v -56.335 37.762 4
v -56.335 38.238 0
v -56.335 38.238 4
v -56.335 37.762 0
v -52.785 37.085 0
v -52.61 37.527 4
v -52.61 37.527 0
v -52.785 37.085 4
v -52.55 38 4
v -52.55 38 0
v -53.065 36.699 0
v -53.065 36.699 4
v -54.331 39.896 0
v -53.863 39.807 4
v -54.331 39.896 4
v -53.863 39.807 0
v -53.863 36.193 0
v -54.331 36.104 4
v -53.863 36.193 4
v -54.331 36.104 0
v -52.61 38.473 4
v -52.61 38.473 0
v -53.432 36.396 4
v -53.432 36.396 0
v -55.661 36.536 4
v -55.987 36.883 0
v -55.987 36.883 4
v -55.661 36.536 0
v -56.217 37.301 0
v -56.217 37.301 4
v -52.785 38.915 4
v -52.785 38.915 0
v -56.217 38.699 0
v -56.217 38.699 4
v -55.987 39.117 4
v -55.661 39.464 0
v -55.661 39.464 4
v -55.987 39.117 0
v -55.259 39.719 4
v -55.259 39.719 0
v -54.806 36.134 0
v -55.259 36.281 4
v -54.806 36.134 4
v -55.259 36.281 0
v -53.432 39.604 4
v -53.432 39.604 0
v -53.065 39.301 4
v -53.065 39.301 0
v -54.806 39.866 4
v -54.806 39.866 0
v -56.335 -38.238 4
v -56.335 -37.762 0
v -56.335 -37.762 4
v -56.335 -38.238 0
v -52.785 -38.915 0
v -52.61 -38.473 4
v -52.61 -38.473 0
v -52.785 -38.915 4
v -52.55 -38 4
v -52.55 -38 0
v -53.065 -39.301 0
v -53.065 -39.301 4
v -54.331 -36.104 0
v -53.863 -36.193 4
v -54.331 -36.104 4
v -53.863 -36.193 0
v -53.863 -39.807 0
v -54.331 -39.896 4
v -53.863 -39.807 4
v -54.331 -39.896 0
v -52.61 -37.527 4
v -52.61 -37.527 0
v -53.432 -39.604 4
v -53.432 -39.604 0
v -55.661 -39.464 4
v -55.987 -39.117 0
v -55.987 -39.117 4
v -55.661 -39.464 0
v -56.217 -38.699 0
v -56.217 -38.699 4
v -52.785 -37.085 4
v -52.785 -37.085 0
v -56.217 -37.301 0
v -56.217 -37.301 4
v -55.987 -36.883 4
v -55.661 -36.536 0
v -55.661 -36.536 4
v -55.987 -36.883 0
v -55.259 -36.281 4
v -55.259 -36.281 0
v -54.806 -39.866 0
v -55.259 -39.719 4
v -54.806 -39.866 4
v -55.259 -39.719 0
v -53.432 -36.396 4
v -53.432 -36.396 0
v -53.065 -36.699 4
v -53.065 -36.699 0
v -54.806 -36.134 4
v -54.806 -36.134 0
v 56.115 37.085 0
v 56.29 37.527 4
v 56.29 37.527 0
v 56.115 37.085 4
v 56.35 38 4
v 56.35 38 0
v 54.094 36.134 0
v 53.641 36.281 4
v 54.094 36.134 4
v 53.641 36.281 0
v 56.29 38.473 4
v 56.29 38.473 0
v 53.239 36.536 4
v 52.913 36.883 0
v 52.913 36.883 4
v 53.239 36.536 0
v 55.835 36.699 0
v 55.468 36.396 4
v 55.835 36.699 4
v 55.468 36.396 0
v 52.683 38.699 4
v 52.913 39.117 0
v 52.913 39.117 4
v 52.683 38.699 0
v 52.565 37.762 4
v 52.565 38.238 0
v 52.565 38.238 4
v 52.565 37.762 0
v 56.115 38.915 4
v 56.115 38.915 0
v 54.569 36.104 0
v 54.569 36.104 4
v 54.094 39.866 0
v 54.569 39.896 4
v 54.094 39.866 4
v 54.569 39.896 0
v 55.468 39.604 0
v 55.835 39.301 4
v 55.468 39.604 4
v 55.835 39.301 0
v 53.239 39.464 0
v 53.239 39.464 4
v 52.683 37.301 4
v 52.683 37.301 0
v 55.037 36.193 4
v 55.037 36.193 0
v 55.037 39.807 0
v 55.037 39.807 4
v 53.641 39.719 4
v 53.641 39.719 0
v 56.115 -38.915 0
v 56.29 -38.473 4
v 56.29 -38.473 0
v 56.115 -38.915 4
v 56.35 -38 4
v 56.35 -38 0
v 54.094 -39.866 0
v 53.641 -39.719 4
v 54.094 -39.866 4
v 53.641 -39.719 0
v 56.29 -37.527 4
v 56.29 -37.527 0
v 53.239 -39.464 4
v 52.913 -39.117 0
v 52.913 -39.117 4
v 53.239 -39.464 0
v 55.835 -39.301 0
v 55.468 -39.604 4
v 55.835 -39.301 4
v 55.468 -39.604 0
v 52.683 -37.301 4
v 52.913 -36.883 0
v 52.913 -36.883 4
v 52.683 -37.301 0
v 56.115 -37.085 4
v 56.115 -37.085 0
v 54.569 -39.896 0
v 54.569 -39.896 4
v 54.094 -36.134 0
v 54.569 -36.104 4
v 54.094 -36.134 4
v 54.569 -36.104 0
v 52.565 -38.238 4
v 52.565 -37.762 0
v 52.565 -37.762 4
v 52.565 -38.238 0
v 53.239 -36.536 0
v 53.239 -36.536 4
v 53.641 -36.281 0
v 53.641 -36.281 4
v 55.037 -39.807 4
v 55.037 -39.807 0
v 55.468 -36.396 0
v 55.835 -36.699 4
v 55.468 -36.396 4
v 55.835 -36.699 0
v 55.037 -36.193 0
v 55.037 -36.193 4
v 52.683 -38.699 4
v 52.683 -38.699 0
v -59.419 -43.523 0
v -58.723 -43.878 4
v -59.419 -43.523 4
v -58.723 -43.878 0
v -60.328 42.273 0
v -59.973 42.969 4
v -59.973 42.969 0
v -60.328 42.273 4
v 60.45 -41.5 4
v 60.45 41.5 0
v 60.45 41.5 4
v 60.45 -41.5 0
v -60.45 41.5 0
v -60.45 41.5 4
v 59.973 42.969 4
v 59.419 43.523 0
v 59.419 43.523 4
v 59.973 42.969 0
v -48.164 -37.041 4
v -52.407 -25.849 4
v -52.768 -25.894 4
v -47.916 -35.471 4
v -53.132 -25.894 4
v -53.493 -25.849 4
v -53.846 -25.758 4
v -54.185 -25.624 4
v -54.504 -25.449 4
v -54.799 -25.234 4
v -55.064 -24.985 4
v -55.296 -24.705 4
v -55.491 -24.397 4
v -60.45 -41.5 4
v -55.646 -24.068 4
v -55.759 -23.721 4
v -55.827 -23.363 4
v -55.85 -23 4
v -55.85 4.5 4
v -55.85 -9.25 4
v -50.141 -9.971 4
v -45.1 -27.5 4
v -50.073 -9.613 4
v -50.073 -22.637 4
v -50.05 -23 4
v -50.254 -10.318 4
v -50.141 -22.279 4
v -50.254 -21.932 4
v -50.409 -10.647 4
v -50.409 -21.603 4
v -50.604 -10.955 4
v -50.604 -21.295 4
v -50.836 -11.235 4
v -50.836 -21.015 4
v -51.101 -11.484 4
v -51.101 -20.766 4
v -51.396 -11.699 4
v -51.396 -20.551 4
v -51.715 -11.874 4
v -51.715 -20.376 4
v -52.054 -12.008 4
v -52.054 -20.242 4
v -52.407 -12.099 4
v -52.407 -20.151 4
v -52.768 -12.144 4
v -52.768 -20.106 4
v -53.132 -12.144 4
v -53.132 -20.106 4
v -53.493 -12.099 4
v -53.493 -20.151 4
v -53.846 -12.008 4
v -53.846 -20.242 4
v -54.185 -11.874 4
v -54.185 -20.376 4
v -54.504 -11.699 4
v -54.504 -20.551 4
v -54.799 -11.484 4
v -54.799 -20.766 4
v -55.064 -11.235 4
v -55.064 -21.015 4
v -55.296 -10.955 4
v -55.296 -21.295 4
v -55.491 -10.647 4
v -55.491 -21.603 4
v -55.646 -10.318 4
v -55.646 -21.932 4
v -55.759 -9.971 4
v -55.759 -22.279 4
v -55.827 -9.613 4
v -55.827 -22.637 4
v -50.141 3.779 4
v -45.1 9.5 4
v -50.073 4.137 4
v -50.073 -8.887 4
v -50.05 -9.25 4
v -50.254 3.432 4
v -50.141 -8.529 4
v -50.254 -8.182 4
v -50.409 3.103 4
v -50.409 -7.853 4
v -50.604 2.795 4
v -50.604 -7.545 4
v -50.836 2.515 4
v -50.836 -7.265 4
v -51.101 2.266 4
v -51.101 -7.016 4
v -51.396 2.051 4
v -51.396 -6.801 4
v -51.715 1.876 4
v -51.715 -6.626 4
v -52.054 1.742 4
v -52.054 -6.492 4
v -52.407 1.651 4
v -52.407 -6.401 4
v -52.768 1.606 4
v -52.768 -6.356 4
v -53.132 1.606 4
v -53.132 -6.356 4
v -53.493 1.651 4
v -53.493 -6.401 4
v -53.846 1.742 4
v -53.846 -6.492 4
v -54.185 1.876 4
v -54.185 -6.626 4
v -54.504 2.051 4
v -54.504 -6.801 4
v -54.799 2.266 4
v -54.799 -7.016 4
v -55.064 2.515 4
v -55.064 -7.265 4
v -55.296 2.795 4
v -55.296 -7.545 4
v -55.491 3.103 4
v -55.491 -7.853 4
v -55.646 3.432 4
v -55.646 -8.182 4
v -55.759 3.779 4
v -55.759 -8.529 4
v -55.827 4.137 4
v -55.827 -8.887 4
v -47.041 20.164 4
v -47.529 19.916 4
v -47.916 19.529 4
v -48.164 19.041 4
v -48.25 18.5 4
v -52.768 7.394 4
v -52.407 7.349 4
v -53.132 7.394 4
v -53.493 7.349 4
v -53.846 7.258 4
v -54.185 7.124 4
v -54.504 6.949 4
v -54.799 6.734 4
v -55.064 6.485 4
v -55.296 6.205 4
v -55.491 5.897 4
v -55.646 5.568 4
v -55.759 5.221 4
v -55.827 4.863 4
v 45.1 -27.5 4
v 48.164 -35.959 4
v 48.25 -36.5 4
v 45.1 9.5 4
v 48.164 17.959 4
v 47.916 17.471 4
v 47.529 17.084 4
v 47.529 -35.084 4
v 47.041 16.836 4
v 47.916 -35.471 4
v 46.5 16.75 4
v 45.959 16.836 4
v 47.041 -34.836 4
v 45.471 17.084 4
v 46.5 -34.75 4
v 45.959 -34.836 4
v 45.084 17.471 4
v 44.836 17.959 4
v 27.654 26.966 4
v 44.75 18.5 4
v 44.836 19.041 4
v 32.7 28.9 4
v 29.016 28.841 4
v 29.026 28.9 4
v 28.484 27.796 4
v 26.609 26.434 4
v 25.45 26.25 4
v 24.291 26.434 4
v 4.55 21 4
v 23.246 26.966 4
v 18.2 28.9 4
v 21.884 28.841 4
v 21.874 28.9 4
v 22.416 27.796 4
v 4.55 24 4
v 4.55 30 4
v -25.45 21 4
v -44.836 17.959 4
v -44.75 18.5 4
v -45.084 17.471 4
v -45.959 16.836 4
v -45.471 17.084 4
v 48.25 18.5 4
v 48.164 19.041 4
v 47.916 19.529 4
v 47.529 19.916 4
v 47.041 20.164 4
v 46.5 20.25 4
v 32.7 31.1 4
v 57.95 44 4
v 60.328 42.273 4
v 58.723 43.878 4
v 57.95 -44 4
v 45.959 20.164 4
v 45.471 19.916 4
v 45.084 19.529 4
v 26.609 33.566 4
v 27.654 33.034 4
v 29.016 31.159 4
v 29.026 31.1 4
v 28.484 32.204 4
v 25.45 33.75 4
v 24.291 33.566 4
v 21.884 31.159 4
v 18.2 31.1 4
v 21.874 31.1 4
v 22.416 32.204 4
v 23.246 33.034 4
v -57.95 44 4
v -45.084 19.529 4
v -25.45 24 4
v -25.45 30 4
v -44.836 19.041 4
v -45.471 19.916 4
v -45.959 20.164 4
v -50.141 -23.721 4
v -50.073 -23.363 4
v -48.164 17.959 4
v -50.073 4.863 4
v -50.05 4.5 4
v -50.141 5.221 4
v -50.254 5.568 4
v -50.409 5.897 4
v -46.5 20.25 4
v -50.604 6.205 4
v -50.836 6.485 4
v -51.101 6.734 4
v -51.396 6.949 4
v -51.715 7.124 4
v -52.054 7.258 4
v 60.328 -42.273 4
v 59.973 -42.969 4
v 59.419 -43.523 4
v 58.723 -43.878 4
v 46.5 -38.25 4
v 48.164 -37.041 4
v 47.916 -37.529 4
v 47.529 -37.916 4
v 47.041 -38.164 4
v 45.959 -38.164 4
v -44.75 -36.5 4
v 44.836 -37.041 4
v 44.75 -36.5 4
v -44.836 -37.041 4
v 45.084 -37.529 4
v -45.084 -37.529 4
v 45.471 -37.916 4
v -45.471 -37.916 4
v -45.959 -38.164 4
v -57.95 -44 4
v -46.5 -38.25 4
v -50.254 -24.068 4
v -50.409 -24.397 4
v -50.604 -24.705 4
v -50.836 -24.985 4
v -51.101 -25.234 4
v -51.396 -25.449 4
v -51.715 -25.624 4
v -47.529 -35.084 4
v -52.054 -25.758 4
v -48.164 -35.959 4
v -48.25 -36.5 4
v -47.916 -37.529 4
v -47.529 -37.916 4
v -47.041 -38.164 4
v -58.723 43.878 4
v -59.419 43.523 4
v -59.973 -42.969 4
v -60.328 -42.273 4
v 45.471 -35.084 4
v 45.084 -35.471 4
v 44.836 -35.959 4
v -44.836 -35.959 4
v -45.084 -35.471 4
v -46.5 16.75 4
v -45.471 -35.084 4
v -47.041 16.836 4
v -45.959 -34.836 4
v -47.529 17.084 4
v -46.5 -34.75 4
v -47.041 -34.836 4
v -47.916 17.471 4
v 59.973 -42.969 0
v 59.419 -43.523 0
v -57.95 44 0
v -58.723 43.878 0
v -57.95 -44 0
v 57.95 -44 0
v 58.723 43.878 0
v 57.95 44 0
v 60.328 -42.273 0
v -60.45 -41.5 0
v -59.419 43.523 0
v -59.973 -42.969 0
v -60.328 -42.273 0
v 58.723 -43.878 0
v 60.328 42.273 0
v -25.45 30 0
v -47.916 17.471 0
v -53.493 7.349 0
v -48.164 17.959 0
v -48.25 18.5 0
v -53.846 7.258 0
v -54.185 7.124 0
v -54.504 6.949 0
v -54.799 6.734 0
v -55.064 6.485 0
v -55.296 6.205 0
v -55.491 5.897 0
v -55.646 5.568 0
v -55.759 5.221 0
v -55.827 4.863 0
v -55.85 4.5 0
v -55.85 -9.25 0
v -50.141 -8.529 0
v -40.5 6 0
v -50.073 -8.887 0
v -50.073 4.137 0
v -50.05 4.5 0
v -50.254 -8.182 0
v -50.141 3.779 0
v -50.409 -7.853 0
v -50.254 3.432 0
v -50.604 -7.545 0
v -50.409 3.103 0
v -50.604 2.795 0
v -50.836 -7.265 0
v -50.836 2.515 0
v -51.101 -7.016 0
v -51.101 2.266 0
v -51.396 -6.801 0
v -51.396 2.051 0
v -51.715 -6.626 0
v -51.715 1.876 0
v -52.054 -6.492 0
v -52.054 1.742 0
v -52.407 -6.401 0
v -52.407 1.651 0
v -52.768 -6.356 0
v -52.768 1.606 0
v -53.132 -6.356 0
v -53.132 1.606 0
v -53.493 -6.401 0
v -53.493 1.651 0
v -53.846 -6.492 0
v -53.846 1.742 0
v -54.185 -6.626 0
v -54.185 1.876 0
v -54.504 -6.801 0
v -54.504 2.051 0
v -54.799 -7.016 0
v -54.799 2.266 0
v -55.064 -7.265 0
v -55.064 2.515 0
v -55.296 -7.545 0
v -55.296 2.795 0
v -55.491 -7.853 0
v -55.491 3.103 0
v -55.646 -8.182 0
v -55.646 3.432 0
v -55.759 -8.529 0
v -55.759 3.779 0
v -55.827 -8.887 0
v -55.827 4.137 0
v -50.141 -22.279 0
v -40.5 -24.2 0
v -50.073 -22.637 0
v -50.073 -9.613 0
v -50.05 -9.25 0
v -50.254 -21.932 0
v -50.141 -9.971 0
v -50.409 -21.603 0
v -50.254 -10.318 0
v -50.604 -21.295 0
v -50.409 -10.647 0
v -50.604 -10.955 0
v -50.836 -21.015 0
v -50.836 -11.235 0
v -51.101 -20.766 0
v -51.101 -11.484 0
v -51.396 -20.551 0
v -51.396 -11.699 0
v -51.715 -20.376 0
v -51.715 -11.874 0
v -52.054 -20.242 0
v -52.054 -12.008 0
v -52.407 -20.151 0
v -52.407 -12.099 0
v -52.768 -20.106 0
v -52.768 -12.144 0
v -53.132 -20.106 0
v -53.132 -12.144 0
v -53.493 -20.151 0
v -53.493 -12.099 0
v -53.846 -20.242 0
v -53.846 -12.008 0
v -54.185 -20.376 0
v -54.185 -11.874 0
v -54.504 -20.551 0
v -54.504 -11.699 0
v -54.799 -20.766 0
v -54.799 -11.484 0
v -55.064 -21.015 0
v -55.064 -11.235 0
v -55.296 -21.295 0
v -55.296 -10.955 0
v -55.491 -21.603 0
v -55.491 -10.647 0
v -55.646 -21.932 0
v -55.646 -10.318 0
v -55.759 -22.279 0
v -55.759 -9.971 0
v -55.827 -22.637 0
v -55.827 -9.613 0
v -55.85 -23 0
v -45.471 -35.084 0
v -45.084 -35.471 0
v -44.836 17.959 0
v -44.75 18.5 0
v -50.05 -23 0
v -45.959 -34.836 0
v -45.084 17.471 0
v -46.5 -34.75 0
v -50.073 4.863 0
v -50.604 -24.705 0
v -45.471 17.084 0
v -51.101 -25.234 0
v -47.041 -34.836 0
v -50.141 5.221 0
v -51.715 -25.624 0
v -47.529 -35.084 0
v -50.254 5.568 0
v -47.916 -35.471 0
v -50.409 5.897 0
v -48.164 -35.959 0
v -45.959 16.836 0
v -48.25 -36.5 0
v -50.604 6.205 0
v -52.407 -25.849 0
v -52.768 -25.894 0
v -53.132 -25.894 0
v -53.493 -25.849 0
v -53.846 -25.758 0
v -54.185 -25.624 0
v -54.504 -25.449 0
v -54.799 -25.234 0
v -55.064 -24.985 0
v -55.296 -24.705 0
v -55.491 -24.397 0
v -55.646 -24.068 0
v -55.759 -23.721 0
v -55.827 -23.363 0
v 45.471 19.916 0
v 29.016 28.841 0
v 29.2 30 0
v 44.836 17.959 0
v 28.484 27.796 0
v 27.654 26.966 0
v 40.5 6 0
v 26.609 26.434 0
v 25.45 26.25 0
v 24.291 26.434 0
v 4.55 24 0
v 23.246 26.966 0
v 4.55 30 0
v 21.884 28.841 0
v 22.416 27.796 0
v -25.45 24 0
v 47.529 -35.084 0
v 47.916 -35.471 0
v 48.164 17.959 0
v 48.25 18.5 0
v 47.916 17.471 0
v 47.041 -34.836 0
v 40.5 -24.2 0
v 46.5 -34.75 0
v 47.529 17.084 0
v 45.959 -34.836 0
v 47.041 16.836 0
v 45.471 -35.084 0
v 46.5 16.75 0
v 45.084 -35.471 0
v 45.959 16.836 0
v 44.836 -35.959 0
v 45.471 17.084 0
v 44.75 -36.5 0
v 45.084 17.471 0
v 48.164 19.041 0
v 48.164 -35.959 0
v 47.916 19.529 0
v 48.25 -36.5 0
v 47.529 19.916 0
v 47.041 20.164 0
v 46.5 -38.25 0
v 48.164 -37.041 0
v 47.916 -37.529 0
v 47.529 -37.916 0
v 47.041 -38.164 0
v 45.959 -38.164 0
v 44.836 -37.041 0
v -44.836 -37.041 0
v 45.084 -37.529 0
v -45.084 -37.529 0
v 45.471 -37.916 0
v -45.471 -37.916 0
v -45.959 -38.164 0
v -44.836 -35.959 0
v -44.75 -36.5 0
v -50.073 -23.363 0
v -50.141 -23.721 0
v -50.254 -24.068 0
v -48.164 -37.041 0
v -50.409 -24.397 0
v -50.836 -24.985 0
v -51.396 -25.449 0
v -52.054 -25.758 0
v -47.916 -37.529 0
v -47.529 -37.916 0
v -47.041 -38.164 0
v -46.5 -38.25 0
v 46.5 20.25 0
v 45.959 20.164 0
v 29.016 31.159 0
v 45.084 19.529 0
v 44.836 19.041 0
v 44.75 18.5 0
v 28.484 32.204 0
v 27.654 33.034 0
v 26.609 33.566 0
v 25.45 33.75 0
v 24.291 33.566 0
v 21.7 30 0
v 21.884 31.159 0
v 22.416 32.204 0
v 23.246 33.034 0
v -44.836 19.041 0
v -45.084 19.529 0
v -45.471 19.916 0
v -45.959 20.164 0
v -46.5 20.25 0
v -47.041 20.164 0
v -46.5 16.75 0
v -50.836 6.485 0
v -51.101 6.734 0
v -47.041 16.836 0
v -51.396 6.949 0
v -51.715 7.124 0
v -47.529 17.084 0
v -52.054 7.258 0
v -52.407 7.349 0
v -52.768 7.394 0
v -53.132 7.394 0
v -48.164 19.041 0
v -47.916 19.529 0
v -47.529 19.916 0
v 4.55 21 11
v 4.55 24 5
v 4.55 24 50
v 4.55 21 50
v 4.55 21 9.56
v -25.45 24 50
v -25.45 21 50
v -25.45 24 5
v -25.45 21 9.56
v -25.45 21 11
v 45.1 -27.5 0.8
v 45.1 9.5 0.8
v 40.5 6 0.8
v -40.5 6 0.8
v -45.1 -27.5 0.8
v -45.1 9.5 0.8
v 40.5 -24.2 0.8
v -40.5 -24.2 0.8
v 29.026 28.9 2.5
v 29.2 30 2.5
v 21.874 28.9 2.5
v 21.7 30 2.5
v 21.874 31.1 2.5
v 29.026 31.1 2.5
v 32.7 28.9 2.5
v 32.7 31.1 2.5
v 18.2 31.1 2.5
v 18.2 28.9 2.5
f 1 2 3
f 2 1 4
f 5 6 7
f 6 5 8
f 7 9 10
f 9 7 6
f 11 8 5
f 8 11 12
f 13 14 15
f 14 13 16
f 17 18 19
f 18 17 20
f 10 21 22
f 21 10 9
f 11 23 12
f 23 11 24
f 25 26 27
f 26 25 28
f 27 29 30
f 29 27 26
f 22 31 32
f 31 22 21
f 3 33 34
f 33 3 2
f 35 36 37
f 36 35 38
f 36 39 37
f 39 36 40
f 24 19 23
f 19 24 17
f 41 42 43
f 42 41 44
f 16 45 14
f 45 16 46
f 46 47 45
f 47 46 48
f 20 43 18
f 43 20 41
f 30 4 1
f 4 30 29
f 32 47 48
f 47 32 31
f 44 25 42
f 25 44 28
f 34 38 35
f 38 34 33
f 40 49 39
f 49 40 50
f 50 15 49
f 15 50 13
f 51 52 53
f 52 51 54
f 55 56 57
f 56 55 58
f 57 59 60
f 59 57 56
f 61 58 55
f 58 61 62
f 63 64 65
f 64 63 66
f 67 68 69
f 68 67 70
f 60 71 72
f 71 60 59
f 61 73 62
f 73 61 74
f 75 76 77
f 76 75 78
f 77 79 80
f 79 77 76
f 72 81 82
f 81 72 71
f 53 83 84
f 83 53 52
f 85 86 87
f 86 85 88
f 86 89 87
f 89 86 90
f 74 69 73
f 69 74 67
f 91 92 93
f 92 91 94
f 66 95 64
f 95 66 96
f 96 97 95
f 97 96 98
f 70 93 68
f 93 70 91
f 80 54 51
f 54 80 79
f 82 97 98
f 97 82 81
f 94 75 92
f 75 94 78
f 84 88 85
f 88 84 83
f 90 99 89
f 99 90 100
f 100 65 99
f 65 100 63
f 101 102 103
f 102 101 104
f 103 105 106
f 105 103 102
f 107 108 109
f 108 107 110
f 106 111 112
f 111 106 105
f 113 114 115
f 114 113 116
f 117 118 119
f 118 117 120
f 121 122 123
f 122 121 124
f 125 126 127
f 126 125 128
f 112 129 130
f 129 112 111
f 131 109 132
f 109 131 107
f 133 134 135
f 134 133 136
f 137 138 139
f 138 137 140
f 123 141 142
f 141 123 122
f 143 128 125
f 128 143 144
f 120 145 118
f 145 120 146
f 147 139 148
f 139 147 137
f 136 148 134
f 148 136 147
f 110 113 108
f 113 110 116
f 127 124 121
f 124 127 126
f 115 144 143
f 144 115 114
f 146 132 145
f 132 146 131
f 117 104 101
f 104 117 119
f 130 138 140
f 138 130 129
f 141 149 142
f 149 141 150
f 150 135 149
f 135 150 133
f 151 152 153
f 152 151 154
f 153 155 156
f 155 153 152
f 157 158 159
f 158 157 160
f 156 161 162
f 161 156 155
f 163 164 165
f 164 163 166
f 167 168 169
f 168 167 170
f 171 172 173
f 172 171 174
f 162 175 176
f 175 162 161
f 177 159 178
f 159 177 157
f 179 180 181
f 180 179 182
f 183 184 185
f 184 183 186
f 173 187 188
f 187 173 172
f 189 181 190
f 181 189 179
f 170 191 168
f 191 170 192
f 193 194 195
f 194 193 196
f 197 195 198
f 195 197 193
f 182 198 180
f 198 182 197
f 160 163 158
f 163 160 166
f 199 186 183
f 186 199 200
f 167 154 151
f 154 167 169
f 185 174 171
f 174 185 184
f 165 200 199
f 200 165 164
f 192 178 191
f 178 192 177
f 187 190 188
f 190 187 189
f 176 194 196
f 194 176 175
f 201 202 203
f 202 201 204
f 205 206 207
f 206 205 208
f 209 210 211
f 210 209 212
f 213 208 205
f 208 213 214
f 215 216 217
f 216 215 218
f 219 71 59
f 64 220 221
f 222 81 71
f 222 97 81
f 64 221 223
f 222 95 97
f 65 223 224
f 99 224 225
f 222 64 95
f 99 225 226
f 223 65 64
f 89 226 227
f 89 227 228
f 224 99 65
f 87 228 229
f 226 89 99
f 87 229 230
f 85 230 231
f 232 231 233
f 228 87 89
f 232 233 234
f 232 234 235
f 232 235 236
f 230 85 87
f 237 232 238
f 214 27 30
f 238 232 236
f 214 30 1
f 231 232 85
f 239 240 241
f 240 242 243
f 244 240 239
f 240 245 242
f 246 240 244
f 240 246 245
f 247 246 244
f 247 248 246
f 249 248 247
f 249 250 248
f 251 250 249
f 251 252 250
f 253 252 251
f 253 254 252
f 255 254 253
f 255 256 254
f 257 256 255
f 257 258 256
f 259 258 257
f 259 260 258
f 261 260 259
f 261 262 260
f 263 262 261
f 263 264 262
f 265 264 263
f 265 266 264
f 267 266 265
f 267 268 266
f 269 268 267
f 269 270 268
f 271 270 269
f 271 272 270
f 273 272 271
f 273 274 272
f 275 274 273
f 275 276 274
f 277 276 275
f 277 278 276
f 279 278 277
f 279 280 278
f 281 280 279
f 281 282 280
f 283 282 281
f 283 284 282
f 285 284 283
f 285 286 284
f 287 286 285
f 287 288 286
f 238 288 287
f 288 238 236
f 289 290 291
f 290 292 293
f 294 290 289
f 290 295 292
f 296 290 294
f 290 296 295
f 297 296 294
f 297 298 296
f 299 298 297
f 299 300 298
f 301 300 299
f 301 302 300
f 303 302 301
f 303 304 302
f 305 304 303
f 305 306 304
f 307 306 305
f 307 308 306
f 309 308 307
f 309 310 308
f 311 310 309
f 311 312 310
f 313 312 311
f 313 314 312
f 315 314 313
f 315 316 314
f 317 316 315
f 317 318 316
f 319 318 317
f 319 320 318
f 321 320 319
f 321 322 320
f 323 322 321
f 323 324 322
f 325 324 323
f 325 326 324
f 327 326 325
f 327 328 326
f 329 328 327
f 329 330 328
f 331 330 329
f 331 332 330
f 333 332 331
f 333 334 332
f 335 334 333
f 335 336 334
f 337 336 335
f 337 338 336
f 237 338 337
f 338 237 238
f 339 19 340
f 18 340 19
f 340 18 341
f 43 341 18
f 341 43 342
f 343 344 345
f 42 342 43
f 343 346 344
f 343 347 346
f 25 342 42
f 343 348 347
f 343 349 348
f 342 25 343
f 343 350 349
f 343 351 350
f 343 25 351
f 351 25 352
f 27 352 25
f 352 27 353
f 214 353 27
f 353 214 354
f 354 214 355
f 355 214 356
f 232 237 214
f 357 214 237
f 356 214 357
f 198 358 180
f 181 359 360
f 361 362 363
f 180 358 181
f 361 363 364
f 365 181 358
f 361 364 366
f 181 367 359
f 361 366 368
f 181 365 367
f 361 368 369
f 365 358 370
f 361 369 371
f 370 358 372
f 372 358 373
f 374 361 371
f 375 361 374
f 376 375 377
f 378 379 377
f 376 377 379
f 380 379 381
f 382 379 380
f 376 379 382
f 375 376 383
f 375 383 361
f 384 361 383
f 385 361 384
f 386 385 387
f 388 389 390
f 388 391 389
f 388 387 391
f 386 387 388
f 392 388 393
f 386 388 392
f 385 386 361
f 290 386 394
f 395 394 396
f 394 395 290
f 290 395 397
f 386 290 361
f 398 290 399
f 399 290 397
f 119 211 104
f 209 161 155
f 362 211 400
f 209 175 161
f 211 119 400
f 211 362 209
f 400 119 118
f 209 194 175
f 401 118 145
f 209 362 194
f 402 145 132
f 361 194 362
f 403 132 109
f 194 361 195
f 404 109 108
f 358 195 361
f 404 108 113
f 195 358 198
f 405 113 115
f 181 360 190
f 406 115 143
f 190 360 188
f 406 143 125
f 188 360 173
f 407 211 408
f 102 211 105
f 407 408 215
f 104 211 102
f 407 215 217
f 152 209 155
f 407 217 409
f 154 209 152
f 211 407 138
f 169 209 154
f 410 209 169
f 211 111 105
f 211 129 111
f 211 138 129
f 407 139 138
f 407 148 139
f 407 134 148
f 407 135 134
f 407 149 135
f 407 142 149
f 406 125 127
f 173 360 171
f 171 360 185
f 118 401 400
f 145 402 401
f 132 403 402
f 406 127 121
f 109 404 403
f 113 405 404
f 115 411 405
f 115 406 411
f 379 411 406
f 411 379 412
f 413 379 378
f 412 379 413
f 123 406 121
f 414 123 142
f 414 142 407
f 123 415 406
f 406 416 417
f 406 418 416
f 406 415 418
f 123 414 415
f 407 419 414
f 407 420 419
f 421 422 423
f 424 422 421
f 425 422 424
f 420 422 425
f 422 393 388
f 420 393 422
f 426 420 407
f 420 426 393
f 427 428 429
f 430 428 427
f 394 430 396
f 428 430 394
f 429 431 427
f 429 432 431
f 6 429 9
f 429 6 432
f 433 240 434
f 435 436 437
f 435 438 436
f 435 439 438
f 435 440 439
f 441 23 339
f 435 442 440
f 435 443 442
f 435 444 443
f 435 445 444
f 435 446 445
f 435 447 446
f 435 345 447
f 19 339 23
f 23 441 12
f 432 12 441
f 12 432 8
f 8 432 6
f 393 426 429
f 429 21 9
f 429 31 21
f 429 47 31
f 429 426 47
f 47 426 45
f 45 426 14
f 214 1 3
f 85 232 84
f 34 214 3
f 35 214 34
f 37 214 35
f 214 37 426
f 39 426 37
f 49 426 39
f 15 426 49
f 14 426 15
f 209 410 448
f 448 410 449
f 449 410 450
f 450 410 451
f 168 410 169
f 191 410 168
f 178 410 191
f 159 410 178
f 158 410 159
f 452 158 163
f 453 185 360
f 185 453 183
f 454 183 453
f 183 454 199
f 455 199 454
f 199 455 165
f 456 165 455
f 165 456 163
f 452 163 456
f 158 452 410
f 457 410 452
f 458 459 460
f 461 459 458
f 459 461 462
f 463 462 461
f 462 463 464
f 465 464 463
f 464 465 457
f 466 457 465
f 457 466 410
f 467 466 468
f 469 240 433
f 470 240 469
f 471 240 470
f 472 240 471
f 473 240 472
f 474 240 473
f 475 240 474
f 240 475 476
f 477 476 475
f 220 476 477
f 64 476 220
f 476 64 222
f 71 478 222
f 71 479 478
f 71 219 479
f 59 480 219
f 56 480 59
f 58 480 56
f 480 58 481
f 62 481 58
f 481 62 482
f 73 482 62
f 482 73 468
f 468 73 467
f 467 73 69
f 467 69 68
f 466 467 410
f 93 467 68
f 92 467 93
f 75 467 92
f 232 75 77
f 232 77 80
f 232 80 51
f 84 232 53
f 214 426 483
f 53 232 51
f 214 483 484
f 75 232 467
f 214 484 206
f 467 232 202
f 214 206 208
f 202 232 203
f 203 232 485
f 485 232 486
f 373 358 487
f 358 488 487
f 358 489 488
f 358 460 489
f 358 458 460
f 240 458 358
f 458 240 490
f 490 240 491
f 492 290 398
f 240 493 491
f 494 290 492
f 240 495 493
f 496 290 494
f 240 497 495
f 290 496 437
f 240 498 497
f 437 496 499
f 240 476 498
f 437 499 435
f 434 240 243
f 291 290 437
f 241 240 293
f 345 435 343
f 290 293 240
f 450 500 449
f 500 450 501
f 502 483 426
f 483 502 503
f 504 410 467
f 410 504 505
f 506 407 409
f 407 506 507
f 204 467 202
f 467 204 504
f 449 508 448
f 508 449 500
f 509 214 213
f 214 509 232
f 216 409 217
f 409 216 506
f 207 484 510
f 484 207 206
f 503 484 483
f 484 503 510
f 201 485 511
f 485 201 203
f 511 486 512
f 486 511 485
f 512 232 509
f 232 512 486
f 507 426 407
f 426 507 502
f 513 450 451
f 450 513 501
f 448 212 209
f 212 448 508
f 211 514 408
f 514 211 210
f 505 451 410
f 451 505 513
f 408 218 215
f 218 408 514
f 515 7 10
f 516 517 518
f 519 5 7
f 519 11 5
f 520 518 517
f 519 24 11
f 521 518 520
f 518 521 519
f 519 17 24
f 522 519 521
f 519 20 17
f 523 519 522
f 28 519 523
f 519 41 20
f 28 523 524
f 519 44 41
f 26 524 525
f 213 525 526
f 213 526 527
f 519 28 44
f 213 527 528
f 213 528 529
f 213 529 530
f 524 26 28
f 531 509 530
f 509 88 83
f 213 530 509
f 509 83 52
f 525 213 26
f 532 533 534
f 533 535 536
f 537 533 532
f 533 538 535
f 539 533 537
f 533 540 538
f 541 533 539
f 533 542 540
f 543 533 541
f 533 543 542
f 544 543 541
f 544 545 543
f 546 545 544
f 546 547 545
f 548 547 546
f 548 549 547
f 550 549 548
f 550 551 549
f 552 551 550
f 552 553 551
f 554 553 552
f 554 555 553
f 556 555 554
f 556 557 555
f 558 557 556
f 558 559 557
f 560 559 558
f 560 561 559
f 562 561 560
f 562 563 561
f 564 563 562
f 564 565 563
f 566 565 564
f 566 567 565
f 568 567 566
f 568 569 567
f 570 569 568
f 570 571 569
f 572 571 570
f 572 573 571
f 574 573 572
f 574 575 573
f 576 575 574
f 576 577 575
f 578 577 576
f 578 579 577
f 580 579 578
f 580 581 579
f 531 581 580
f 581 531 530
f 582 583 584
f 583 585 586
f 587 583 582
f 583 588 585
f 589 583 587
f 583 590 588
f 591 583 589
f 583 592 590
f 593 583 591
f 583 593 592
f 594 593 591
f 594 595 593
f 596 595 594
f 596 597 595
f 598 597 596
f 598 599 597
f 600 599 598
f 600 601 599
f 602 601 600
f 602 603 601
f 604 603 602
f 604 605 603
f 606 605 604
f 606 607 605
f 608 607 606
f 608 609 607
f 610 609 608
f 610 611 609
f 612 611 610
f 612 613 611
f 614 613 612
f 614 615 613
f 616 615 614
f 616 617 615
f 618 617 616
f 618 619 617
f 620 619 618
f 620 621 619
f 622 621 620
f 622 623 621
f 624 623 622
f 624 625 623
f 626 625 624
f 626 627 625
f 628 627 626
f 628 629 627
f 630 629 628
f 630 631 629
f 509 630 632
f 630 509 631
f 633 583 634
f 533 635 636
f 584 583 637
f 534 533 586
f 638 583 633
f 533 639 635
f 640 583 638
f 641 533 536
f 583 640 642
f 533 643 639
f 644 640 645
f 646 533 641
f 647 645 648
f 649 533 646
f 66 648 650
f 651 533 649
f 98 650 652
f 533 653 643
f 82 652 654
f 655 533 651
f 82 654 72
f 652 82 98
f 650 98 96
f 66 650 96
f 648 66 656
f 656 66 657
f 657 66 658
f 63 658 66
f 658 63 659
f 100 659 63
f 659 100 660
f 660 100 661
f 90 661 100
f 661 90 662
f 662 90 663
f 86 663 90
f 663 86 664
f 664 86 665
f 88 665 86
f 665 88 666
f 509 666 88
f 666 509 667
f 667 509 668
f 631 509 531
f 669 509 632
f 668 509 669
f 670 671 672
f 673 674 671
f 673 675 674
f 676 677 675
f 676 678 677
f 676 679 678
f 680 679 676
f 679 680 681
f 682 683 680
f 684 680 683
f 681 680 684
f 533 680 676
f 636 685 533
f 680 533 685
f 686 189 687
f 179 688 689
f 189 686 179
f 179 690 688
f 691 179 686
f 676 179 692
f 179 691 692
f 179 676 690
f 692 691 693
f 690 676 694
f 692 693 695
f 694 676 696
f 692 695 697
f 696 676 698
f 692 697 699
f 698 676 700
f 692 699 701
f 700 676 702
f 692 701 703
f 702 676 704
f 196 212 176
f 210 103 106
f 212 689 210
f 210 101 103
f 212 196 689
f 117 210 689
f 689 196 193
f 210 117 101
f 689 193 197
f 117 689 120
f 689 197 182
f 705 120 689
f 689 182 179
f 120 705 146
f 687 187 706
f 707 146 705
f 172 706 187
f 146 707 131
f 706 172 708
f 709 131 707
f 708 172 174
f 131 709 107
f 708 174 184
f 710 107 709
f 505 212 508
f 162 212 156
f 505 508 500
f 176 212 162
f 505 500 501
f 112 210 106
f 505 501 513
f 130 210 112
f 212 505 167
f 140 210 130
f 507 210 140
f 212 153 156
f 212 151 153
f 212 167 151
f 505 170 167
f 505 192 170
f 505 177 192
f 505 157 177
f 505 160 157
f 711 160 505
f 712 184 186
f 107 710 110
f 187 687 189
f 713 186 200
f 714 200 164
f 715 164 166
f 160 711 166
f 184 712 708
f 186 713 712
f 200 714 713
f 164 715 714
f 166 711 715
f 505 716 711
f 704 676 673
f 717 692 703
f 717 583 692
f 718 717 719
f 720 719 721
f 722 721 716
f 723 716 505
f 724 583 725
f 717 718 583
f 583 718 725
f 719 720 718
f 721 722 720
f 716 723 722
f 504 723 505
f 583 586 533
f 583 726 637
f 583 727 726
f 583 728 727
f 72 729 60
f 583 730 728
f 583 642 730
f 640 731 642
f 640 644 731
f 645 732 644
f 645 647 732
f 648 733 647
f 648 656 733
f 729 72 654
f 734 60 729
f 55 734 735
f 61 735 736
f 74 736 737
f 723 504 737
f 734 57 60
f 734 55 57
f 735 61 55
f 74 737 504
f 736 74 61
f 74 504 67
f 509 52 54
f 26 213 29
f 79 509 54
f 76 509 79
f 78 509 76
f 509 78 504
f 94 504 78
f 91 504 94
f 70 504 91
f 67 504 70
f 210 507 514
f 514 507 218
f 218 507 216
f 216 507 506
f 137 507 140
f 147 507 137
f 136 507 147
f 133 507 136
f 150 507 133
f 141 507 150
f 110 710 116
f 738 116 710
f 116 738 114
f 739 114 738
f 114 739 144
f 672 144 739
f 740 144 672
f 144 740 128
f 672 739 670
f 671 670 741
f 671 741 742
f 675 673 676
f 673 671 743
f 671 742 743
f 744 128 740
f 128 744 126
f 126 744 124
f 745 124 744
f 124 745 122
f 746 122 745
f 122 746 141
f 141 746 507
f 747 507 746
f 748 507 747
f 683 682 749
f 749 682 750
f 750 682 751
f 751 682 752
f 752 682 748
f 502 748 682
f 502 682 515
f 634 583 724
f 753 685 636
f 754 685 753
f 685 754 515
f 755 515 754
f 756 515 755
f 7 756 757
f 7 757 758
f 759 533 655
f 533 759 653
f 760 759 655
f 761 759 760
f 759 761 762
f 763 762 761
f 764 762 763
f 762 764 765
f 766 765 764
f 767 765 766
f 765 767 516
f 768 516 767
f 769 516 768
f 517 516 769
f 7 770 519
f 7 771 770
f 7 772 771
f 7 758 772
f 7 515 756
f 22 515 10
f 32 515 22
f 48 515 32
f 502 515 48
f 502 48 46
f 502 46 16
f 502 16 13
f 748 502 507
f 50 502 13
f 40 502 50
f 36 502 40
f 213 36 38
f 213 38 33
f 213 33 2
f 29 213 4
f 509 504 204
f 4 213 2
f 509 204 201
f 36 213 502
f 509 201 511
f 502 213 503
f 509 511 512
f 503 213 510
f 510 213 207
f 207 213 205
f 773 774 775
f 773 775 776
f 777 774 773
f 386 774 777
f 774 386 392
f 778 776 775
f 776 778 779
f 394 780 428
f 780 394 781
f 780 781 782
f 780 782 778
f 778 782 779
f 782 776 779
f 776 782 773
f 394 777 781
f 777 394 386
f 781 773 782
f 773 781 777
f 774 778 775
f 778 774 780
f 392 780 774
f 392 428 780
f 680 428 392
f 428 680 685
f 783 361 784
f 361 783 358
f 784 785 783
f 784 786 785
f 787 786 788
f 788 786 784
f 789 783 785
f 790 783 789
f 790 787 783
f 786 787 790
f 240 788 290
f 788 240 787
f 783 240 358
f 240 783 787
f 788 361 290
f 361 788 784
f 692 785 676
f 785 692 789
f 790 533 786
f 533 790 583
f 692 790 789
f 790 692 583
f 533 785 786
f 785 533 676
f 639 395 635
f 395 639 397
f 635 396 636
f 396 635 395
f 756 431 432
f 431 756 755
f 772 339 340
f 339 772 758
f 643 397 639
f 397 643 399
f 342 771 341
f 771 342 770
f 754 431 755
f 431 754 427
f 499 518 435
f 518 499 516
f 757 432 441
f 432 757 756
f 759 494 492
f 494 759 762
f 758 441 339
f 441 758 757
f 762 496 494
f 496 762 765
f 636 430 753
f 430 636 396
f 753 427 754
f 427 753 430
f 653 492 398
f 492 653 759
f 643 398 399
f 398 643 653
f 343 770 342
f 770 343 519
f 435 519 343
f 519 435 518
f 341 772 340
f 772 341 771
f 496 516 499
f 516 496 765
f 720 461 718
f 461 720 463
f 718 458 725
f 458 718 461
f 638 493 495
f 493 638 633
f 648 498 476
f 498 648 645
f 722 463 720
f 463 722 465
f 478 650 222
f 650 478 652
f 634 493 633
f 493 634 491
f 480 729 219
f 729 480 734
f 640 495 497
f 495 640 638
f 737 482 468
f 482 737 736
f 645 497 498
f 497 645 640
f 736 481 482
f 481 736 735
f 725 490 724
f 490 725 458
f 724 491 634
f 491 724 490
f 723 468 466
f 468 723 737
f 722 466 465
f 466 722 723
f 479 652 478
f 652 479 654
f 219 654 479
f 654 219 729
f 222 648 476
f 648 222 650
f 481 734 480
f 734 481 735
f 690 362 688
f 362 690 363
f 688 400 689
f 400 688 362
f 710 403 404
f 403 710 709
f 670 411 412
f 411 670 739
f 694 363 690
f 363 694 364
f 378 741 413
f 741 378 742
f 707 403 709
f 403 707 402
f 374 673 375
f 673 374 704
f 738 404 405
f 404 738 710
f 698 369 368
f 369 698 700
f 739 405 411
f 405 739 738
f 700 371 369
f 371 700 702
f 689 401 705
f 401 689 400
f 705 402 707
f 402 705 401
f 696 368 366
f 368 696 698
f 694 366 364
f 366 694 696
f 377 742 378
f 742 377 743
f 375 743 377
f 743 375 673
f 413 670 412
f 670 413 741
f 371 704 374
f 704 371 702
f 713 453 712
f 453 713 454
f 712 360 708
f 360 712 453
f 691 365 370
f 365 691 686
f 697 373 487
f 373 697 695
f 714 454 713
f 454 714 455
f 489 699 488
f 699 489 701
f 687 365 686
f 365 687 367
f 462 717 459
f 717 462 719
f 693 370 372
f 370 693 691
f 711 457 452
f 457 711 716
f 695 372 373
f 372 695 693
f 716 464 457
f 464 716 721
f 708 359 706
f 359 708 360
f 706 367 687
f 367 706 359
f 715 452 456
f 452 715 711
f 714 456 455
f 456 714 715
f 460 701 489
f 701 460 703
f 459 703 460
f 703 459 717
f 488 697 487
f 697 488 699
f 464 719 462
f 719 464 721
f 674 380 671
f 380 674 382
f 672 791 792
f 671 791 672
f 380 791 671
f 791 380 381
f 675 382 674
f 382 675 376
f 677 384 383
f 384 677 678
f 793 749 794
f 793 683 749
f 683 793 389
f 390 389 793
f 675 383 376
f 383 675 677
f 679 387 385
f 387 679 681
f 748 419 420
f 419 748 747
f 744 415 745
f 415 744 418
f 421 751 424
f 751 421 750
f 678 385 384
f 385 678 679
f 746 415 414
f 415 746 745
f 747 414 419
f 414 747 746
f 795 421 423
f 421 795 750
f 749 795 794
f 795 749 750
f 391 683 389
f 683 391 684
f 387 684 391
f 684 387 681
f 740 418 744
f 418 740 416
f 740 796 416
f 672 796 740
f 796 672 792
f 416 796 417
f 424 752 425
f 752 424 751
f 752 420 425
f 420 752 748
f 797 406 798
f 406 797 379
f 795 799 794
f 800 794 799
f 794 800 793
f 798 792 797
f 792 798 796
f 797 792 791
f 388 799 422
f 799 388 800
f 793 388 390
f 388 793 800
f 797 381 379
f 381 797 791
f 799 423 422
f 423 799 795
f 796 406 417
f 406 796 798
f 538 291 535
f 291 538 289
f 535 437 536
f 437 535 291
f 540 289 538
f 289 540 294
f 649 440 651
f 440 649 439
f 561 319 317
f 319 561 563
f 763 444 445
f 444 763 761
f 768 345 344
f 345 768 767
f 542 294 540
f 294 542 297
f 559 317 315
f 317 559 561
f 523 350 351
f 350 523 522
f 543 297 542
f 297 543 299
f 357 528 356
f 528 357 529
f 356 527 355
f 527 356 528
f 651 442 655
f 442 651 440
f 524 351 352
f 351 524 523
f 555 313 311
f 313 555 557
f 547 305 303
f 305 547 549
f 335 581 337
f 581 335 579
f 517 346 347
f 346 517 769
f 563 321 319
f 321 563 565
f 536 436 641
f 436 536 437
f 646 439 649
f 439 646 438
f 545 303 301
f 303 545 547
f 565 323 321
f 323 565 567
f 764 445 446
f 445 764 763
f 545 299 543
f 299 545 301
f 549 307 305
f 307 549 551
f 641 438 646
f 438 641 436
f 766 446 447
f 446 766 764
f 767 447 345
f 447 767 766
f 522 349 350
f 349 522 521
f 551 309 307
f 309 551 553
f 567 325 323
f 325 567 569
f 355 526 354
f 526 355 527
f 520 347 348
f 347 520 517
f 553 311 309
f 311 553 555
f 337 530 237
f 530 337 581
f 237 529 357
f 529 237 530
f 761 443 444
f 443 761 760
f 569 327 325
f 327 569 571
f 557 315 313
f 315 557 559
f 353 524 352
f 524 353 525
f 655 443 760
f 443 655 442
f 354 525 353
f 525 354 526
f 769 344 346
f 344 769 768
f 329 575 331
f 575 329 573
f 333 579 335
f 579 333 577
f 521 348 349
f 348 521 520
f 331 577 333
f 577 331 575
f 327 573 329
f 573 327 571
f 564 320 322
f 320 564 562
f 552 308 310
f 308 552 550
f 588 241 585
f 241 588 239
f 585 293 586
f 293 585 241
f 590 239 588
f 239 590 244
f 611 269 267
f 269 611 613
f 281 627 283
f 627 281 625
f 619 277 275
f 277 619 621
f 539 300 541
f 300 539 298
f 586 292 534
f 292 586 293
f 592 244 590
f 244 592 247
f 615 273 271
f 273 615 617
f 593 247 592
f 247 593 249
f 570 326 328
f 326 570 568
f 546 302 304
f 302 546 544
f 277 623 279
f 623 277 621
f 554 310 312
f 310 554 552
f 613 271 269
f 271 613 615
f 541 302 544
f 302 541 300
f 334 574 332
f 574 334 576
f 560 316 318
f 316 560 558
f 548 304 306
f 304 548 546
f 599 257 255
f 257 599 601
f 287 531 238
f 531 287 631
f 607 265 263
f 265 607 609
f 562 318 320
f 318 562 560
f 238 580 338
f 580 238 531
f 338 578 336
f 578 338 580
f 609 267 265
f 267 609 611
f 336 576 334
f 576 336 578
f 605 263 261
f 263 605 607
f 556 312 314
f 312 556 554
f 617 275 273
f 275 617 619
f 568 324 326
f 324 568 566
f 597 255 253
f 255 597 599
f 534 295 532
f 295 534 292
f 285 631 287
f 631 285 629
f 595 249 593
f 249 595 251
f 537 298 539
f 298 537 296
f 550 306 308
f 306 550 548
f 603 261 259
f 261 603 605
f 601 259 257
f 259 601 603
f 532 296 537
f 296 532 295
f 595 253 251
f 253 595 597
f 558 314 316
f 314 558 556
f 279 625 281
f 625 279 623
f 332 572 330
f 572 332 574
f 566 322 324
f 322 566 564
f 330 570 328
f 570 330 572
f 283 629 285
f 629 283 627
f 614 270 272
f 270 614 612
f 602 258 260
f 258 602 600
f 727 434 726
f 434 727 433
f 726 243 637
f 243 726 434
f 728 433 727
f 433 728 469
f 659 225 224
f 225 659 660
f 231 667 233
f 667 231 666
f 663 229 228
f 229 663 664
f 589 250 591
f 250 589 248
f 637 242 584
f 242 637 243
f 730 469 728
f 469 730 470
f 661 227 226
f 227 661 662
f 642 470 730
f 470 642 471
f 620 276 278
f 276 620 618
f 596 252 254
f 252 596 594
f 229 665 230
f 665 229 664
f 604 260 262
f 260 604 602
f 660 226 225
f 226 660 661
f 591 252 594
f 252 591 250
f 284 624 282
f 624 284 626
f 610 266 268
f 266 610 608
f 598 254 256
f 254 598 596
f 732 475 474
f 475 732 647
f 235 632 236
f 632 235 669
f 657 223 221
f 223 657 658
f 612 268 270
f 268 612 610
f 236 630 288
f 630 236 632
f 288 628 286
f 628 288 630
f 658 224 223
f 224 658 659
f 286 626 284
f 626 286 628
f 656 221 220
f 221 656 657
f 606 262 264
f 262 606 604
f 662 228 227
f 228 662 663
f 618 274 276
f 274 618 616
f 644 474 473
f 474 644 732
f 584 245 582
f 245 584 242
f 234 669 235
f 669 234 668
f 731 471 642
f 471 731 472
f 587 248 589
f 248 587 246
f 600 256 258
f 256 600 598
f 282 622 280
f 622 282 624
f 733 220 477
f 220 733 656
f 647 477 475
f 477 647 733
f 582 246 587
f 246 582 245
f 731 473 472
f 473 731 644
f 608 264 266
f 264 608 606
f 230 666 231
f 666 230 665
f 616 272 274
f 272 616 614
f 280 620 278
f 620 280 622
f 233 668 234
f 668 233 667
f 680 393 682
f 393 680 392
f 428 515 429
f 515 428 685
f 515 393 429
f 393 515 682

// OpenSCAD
// Ramps cooler bracket/guard. By Justblair (Blair Thompson) 

// This is a design for a front panel for my Prusa Printer, but it is 
// more than likely of use for any of the 3D printers 
// Please take a moment or two to adjust the parameters to your needs.

// Please adjust the hole sizes to match your printer and your preffered mounting
// bolts.  

// To keep up to date with my latest projects check www.justblair.co.uk

// Options

LED_holes = true;
kill_button = false;
SD_card = true;

// Dimensions

lcd_board_width = 120.9;  
lcd_board_length = 88;
lcd_board_thickness = 4;  	// 4mm is pretty thick and solid, I estimate 2mm would do

rotary_encoder_diameter = 7.5;
kill_switch_diameter = 16.4;

sd_card_width = 30;			// The width of the SD card module
sd_card_depth = 50;			// The depth of the SD card module
sd_card_height = 6;			// The height of the SD card module

ard_hole_radius = 1.9; 		// for M3 bolt, adjust to your printer/mounts
LED_Rad = 2.9;  			// for 5mm diameter LED, adjust to your printer...
mount_holes_inset = 6;		// How far in from outside edges shoudl the mount holes be

$fn = 20;					// Adust the smoothness of the holes


// Here comes the code!!

rotate ([180, 0,0])
translate([-lcd_board_width/2, -lcd_board_length/2,-lcd_board_thickness])
lcd_complete();

module lcd_complete(){
	difference() {
		union (){
			base();
			sd_card_support();
		}
		translate ([(lcd_board_width-98)/2, (lcd_board_length - 65),-7])
			#lcd_dummy();
		rotary_encoder();
		if (kill_button == true){
			kill_switch();
		}
		if (SD_card == true){
			sd_card_cutout();
		}
		if (LED_holes == true){
			led_mounts();
		}
	}
}

module lcd_dummy(){		// This is used to create the cutout for the 20*4 LCD
	difference(){
		union(){
			cube ([98, 60, 1.44]);
			translate([2.5+1.4, 11.5, 0])
				cube([90.2 , 37, 10.2]);
			translate([2.5+6,15,0])
				cube([76 +5, 25.2 + 5, 21.5]);
			translate([2.5,2.5,-1])
				cylinder (r=3.5/2, h=22.5);
			translate([2.5, 60-2.5,-1])
				cylinder (r=3.5/2, h=22.5);
			translate([98-2.5,2.5,-1])
				cylinder (r=3.5/2, h=22.5);
			translate([98-2.5, 60-2.5,-1])
				cylinder (r=3.5/2, h=22.5);
		}	
	}
}

module kill_switch(){	// Creates a cutout for a kill switch if required.
	translate ([35, 14,-1])
		cylinder(r = kill_switch_diameter/2, h = lcd_board_thickness + 2);
}

module base(){
	difference()
	{
		translate ([lcd_board_width/2, lcd_board_length/2, 0]) 
		roundedRect([lcd_board_width - 2.5, lcd_board_length - 2.5,lcd_board_thickness], 2.5);
		// translate ([0,lcd_board_length-53.34,0])
		mounting_holes();
		// translate ([99.06, 40.64, 0]) cube ([2.54, 12.7, 1.6]);
	}
}

module sd_card_cutout (){
	translate ([35, 14,-1])
	cube ([sd_card_width,sd_card_height,30], center = false);
}
module sd_card_support (){
	translate ([35, 14 + sd_card_height, lcd_board_thickness - sd_card_depth])
	# cube ([sd_card_width,3, sd_card_depth], center = false);
}

module rotary_encoder(){
		translate ([lcd_board_width-35, 14,-1]) {
			cylinder (r=rotary_encoder_diameter/2, h= lcd_board_thickness +2);
			cube([14.5, 2.2,5], center = true);
			translate ([0,0,-3])
			%cube([14.5,12,7], center = true);
			}
		translate ([lcd_board_width-35, 14, 5])
			%cylinder (r=25/2, h= 17);			
}


module led_mounts(){
	translate ([7.5,lcd_board_length/2-4.5,0]) {
		translate ([0,0,-1]) led_hole();
		translate ([0,27.5/2,-1]) led_hole();
		translate ([0,27.5,-1]) led_hole();
	}
}

module led_hole(){
	cylinder (r=LED_Rad, h=(lcd_board_thickness+2), $fn=50);
}

module mounting_holes(){
	translate ([mount_holes_inset,mount_holes_inset,-1]) hole(); //lower left hole
	translate ([ mount_holes_inset,lcd_board_length -mount_holes_inset, - 1]) hole(); //upper left hole
	translate ([lcd_board_width -mount_holes_inset, mount_holes_inset,-1]) hole(); //lower right hole
	translate ([lcd_board_width -mount_holes_inset,lcd_board_length -mount_holes_inset,-1]) hole(); //upper right hole
}

module hole(){
	cylinder(r=ard_hole_radius, h=(lcd_board_thickness+2), $fn=25);
}

module roundedRect(size, radius) {
	x = size[0]; 
	y = size[1]; 
	z = size[2]; 

	linear_extrude(height=z) 
	hull() { 
		// place 4 circles in the corners, with the given radius 
		translate([(-x/2)+(radius/2), (-y/2)+(radius/2), 0]) circle(r=radius); 
		translate([(x/2)-(radius/2), (-y/2)+(radius/2), 0]) circle(r=radius); 
		translate([(-x/2)+(radius/2), (y/2)-(radius/2), 0]) circle(r=radius); 
		translate([(x/2)-(radius/2), (y/2)-(radius/2), 0]) circle(r=radius); 
		translate([0,0,0]);
	} 
}
